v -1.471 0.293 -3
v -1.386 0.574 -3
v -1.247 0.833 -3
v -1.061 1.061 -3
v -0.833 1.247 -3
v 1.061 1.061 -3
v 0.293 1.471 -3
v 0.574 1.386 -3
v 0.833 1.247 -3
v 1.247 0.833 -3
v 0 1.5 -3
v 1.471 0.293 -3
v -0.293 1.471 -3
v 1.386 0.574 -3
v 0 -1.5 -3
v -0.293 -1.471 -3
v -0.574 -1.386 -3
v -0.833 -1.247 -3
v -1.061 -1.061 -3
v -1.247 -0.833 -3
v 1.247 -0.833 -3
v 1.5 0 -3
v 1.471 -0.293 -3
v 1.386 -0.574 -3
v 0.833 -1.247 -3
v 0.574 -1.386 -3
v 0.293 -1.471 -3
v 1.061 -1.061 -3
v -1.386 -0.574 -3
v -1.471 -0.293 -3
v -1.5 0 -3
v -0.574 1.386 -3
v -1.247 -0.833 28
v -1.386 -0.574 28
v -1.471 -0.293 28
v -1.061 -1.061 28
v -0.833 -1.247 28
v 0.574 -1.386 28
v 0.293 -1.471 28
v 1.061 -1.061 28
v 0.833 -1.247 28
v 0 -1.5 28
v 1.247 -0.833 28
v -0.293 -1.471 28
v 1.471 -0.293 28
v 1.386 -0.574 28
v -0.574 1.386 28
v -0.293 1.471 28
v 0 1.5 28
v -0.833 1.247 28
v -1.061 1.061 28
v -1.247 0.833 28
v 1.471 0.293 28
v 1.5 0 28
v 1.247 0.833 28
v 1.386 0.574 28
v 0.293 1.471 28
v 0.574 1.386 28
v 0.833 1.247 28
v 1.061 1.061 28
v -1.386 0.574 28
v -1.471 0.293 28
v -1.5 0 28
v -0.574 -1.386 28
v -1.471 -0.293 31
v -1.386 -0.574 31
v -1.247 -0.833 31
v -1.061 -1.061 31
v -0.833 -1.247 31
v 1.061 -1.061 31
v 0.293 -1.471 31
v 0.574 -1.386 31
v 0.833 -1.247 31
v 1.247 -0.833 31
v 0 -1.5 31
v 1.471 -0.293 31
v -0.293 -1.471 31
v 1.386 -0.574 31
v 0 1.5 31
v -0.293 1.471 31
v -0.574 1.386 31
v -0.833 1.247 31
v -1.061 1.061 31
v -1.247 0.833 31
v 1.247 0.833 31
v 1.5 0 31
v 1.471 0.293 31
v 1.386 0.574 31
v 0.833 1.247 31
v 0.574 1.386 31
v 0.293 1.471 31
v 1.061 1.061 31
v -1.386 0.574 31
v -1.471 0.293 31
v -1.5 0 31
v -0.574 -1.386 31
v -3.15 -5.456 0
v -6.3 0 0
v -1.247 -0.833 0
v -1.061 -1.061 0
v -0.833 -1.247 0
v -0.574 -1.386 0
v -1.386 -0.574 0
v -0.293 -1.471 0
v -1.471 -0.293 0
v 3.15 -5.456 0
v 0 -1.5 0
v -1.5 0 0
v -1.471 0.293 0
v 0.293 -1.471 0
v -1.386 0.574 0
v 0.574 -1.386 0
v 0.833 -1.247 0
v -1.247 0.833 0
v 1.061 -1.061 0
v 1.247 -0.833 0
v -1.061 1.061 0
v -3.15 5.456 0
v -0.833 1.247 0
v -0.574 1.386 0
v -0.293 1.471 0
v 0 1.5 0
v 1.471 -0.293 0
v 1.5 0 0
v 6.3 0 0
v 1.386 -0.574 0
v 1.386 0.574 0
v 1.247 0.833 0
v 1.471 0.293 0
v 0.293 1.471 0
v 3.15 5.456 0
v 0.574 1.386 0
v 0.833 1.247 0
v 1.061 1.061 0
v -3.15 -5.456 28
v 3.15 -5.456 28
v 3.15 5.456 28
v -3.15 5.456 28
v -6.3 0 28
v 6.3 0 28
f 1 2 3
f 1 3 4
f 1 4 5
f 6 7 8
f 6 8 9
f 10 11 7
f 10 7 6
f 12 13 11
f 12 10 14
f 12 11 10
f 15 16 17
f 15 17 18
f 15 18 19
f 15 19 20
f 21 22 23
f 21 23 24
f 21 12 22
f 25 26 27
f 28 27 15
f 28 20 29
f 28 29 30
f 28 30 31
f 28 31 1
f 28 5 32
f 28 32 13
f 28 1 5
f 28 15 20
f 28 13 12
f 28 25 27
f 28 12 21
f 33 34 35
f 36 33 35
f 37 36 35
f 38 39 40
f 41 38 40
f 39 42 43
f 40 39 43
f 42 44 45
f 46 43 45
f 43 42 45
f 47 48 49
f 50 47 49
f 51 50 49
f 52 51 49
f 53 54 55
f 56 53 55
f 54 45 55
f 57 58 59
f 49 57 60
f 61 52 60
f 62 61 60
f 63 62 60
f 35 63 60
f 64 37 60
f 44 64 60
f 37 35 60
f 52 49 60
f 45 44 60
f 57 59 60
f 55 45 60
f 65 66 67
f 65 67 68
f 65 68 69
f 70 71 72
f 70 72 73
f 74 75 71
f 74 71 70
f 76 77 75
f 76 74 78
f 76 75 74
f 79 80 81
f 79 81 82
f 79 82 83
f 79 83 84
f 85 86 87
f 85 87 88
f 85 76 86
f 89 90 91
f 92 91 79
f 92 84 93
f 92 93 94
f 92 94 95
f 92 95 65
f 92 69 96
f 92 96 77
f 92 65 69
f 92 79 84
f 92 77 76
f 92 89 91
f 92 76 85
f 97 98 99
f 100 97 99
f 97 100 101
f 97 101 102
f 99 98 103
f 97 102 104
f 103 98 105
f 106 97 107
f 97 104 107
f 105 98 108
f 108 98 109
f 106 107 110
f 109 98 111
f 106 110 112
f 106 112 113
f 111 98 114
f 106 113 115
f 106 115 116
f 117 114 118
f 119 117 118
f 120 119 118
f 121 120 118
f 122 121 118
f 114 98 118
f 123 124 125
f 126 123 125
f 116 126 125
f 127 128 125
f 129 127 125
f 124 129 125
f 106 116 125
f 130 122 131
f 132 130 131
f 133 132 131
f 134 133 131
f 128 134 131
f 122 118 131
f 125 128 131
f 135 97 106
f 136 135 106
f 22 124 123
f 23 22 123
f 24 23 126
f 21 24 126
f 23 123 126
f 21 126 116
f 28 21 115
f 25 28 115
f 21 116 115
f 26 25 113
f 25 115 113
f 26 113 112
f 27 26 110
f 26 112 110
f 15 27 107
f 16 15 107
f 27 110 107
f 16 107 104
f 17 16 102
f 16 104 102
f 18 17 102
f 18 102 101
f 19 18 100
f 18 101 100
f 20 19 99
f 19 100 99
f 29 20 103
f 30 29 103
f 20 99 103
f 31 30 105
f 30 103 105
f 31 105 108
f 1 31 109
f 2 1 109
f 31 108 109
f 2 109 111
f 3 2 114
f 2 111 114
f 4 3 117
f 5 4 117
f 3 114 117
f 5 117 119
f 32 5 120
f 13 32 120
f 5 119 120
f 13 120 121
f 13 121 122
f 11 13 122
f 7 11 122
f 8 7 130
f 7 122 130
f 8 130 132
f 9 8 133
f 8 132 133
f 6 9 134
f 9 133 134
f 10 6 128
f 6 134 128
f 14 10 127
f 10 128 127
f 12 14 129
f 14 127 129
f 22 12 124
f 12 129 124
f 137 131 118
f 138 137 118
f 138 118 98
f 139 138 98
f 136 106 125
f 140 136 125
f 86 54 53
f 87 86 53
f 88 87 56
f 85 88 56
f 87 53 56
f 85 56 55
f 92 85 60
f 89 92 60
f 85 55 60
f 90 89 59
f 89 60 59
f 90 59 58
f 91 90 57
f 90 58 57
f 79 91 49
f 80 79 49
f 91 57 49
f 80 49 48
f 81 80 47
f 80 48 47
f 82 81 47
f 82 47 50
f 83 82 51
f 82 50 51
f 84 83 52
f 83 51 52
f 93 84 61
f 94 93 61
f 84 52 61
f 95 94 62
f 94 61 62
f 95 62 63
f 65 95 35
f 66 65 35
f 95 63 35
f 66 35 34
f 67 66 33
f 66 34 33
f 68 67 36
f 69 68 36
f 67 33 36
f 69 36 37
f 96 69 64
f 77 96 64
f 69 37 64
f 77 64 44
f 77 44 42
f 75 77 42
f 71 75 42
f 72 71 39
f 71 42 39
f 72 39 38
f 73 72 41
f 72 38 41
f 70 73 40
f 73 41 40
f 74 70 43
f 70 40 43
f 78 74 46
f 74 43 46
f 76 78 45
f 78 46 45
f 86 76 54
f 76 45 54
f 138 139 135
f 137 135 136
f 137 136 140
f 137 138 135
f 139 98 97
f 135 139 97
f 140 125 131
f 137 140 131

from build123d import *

# Parameters (mm, degrees)
F1_DEPTH = 28
F2_R     = 1.5
F3_DEPTH = 3
F4_R     = 1.5
F5_DEPTH = 3


with BuildPart() as f1:
    # F0 (on Top) → F1 (new body)
    with BuildSketch(Plane.XY):
        Polygon((3.15, 5.4559600438), (-3.15, 5.4559600438), (-6.3, 0), (-3.15, -5.4559600438), (3.15, -5.4559600438), (6.3, 0), align=None)
    extrude(amount=F1_DEPTH)

    # F4 (on face) → F5 (join)
    with BuildSketch(Plane(origin=(0, 0, 0), x_dir=(1, 0, 0), z_dir=(0, 0, -1))):
        Circle(F4_R)
    extrude(amount=F5_DEPTH)


with BuildPart() as f3:
    # F2 (on face) → F3 (new body)
    with BuildSketch(Plane.XY.offset(28)):
        Circle(F2_R)
    extrude(amount=F3_DEPTH)


solid = Compound([f1.part, f3.part])
